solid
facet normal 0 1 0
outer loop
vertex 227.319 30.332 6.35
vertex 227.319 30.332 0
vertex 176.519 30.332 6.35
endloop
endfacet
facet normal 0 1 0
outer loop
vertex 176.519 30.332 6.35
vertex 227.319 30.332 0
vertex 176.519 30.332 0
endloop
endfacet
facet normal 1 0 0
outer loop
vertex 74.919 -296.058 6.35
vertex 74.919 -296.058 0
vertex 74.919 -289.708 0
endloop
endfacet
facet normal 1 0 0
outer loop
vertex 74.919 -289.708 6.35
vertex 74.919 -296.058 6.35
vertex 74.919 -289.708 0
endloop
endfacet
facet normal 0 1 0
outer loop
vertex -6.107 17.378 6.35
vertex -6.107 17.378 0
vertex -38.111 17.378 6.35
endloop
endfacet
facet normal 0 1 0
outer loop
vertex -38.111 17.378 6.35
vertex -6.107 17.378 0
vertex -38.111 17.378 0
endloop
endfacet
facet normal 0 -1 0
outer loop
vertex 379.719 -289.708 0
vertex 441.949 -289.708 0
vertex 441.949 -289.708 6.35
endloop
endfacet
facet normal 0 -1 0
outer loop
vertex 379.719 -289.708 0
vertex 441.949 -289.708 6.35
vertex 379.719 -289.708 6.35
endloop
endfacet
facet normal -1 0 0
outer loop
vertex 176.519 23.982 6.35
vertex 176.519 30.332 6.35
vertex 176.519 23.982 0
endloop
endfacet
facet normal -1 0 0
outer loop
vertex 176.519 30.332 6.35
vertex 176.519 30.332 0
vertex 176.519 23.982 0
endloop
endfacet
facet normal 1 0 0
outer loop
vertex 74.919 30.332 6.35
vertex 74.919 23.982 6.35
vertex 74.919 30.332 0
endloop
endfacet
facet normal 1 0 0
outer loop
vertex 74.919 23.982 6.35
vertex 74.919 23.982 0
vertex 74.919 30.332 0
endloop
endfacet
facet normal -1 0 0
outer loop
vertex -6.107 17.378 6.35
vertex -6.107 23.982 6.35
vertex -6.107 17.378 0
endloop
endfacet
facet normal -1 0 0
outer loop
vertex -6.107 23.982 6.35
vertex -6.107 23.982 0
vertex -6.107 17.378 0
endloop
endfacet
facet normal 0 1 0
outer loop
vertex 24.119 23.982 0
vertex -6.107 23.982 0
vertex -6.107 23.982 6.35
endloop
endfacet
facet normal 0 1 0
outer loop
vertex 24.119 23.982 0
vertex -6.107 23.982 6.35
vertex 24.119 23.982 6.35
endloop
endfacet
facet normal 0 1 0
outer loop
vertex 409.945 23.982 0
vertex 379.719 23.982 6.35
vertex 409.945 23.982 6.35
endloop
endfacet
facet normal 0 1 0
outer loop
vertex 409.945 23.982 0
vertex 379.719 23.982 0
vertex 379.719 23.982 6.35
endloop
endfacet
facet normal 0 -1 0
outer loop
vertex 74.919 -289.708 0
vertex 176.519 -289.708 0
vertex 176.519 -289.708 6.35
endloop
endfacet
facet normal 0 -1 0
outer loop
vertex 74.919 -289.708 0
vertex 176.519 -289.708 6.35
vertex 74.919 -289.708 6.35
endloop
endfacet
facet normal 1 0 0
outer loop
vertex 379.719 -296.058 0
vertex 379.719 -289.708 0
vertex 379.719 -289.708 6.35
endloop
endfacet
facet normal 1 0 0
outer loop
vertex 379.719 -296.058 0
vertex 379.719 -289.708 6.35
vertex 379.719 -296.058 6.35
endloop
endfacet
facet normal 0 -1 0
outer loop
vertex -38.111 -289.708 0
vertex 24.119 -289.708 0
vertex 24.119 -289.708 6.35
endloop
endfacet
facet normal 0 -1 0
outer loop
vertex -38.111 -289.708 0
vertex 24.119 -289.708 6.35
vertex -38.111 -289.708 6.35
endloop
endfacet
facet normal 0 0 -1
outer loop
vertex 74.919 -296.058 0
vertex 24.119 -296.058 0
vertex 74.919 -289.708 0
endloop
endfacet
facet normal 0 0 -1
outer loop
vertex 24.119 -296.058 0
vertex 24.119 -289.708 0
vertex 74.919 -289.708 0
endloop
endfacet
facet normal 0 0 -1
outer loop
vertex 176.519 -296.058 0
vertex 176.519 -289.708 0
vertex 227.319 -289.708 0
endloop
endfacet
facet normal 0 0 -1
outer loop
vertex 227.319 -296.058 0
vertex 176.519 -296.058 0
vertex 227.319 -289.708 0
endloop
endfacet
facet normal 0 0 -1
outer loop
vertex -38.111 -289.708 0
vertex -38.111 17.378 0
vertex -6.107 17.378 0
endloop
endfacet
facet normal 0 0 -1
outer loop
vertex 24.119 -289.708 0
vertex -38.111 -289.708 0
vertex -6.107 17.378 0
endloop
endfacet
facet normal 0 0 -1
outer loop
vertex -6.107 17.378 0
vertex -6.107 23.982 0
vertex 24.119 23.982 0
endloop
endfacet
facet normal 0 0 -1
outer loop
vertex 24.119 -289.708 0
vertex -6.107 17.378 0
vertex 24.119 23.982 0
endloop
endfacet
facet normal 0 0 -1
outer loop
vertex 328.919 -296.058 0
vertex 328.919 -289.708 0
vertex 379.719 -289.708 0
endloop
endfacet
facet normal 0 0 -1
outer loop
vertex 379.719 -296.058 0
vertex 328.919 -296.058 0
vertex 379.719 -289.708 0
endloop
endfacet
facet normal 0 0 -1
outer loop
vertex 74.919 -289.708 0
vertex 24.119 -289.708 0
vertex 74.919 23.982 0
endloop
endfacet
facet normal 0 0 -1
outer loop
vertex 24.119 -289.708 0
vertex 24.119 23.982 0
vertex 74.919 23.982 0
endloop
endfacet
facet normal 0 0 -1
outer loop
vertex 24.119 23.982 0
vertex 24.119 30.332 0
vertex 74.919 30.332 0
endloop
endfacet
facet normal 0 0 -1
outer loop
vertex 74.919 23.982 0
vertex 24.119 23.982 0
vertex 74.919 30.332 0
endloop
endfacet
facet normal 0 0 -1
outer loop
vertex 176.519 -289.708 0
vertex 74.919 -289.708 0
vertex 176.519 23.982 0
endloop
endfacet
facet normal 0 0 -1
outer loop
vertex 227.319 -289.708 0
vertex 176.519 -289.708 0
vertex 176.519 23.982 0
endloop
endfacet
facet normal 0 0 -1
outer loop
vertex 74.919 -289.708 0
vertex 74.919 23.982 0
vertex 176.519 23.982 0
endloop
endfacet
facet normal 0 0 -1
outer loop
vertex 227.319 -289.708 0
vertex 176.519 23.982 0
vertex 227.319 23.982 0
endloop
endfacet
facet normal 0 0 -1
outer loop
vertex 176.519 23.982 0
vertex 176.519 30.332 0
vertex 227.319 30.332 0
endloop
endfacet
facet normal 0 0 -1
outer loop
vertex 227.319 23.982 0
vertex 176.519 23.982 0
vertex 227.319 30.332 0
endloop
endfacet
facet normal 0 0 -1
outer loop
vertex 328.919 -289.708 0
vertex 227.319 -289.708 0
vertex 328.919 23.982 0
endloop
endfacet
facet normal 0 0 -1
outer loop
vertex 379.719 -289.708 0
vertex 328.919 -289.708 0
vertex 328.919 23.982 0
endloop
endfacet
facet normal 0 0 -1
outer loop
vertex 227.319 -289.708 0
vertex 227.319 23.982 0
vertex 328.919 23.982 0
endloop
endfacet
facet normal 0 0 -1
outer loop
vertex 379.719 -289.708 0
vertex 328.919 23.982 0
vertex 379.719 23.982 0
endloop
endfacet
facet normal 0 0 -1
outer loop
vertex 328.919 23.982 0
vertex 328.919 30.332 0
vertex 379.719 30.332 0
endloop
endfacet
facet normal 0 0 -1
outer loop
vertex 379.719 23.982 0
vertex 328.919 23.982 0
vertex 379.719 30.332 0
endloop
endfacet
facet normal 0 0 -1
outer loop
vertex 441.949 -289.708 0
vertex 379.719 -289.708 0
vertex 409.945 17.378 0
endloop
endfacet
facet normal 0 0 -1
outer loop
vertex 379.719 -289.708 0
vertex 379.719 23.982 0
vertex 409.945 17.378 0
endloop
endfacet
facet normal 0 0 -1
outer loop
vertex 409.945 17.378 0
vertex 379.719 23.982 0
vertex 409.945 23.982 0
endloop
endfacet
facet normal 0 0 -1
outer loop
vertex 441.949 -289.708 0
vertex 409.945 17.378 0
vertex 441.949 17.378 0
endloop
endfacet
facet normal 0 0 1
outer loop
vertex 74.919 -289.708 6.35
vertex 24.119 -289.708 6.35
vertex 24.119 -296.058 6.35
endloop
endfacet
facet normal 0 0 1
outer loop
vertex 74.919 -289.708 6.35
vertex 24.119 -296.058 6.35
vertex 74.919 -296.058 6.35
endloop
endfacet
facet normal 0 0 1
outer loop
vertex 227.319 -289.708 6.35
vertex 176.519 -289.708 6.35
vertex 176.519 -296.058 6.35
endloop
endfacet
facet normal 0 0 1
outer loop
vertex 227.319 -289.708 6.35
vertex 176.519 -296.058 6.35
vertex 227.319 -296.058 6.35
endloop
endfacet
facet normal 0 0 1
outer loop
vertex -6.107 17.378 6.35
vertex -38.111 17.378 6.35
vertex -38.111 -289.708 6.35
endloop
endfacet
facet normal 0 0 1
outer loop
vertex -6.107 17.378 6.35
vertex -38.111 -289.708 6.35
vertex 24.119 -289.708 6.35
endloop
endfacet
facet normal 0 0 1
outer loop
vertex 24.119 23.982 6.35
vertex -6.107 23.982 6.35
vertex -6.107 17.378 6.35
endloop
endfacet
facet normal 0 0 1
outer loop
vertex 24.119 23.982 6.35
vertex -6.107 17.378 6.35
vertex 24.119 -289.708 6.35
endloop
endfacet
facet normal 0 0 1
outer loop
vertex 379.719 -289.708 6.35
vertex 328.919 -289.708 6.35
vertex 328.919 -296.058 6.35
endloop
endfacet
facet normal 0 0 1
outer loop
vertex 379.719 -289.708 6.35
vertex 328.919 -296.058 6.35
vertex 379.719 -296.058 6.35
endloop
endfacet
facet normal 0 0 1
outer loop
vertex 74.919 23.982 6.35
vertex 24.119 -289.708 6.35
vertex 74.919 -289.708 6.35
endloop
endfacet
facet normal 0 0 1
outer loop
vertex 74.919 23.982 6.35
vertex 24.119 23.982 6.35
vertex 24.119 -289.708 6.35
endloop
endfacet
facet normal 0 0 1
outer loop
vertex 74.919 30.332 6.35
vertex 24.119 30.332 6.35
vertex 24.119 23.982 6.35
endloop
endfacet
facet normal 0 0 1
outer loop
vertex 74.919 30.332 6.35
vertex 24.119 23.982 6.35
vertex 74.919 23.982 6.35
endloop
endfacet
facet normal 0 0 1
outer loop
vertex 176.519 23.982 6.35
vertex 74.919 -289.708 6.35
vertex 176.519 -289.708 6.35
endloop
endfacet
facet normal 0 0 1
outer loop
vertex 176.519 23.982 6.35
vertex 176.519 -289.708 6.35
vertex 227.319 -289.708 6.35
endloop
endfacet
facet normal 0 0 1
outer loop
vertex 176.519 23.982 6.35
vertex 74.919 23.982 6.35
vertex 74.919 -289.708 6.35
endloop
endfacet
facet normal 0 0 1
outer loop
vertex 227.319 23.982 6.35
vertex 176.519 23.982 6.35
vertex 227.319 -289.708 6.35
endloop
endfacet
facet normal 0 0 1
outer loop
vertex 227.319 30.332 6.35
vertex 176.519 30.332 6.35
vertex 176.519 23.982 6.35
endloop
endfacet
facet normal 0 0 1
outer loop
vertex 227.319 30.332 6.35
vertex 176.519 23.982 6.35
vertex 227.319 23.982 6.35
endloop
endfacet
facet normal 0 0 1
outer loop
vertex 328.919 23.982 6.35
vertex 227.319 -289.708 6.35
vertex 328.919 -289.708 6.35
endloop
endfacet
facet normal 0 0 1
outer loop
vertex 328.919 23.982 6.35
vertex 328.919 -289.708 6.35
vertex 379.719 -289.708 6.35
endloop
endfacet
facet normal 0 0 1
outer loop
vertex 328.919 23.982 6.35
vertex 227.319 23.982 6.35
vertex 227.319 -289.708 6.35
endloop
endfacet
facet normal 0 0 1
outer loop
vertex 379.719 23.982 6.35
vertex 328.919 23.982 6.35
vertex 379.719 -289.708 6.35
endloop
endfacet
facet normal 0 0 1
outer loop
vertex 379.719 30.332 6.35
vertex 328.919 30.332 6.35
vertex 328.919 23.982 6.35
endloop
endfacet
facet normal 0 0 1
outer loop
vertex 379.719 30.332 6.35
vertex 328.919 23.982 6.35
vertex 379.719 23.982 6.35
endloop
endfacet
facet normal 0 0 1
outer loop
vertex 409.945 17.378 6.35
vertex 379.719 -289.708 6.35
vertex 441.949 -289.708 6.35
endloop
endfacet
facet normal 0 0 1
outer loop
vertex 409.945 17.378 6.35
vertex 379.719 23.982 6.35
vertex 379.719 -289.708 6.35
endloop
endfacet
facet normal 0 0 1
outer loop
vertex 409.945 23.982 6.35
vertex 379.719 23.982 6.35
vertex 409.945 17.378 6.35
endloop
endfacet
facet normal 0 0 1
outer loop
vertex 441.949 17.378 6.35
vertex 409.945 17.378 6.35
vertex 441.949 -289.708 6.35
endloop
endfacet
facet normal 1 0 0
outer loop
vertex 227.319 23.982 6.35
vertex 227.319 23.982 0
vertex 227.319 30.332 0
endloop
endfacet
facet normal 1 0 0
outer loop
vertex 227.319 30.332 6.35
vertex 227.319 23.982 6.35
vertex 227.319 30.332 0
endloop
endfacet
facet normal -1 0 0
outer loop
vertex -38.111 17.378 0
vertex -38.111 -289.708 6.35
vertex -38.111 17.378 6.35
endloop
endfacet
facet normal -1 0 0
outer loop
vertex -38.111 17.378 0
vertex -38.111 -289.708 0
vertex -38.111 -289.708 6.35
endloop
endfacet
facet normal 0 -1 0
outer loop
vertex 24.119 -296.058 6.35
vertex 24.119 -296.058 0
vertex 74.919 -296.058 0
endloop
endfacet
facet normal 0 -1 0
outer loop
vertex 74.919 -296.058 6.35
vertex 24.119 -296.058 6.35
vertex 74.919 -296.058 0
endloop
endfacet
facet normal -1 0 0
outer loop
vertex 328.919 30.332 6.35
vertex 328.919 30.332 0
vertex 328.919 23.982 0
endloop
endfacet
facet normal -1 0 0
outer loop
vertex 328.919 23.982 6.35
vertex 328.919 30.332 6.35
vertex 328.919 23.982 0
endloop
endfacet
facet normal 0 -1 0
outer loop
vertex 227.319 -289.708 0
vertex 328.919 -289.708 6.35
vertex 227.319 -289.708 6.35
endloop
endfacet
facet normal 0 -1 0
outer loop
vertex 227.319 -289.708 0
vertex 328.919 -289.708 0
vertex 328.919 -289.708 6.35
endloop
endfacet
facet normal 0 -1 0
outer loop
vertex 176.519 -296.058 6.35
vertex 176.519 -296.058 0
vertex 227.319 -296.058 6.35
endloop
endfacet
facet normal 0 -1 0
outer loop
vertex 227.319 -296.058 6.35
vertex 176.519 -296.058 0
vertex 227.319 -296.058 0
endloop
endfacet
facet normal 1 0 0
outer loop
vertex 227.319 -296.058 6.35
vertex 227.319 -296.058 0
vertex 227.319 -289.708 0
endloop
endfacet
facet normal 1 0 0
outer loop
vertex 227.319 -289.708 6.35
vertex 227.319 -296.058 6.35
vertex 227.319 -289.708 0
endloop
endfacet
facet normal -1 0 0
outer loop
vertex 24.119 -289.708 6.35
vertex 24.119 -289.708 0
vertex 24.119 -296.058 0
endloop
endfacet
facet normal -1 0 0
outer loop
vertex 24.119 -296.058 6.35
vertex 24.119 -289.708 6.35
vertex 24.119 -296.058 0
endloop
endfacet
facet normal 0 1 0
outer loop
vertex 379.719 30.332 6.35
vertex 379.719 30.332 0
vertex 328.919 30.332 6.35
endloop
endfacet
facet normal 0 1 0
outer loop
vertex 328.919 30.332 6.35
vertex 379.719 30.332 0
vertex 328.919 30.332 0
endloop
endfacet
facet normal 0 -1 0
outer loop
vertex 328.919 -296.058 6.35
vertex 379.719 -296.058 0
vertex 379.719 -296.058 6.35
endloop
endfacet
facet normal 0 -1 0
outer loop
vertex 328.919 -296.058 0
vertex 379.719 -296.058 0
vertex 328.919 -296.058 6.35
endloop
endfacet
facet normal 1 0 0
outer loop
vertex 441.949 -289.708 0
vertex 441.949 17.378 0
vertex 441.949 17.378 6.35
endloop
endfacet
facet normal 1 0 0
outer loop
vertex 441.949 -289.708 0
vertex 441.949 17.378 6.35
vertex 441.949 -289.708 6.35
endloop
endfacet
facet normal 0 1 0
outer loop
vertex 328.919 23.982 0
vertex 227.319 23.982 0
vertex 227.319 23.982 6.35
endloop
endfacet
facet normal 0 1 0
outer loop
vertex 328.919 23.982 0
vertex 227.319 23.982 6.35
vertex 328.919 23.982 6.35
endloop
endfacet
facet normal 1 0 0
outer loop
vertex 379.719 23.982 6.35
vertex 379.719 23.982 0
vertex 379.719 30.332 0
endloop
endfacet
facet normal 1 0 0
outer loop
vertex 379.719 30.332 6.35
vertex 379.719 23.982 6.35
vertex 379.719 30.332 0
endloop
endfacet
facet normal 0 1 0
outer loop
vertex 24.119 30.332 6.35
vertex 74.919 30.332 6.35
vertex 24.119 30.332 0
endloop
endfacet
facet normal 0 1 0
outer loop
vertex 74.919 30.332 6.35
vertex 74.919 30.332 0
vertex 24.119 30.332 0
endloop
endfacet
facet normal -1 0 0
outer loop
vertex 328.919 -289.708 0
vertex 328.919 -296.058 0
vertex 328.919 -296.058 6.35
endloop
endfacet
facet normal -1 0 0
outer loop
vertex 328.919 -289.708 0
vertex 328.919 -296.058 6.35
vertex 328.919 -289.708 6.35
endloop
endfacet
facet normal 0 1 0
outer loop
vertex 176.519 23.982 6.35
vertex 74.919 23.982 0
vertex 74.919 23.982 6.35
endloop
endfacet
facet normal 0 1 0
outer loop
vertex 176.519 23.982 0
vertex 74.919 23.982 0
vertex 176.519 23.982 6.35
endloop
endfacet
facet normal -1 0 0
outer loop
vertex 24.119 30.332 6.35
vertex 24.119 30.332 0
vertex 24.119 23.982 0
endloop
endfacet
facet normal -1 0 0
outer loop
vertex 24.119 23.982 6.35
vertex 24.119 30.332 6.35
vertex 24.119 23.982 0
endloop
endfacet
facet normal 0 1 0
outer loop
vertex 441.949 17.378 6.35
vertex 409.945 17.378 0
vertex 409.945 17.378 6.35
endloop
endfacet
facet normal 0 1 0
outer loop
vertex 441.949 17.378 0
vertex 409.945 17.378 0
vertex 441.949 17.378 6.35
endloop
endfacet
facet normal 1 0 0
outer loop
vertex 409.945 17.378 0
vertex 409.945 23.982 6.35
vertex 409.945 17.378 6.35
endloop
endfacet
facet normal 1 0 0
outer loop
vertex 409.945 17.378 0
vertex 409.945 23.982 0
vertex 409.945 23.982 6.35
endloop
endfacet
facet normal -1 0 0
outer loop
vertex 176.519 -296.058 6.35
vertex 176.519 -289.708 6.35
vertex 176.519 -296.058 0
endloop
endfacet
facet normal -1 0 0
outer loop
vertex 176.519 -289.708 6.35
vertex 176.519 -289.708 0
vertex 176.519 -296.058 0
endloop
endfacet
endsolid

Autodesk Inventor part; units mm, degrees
ref_plane "YZ Plane" through (0, 0, 0) normal (1, 0, 0) x (0, 1, 0)
ref_plane "XZ Plane" through (0, 0, 0) normal (0, 1, 0) x (-1, 0, 0)
ref_plane "XY Plane" through (0, 0, 0) normal (0, 0, 1) x (1, 0, 0)
sketch "Sketch1" plane through (0, 0, 0) normal (0, 0, 1) x (1, 0, 0)
  line L0 (-38.1107, 23.9821) -> (441.9493, 23.9821)
  line L1 (441.9493, 23.9821) -> (441.9493, -289.7079)
  line L2 (441.9493, -289.7079) -> (-38.1107, -289.7079)
  line L3 (-38.1107, -289.7079) -> (-38.1107, 23.9821)
  line L4 (-38.1107, -289.7079) -> (227.3193, -289.7079)
  line L5 (227.3193, -289.7079) -> (176.5193, -289.7079)
  line L6 (176.5193, -289.7079) -> (176.5193, -296.0579)
  line L7 (176.5193, -296.0579) -> (227.3193, -296.0579)
  line L8 (227.3193, -296.0579) -> (227.3193, -289.7079)
  line L9 (227.3193, -289.7079) -> (328.9193, -289.7079)
  line L10 (328.9193, -289.7079) -> (74.9193, -289.7079)
  line L11 (74.9193, -289.7079) -> (24.1193, -289.7079)
  line L12 (24.1193, -289.7079) -> (24.1193, -296.0579)
  line L13 (24.1193, -296.0579) -> (74.9193, -296.0579)
  line L14 (74.9193, -296.0579) -> (74.9193, -289.7079)
  line L15 (328.9193, -289.7079) -> (379.7193, -289.7079)
  line L16 (379.7193, -289.7079) -> (379.7193, -296.0579)
  line L17 (379.7193, -296.0579) -> (328.9193, -296.0579)
  line L18 (328.9193, -296.0579) -> (328.9193, -289.7079)
  line L19 (24.1193, 23.9821) -> (74.9193, 23.9821)
  line L20 (74.9193, 23.9821) -> (74.9193, 30.3321)
  line L21 (74.9193, 30.3321) -> (24.1193, 30.3321)
  line L22 (24.1193, 30.3321) -> (24.1193, 23.9821)
  line L23 (176.5193, 23.9821) -> (227.3193, 23.9821)
  line L24 (227.3193, 23.9821) -> (227.3193, 30.3321)
  line L25 (227.3193, 30.3321) -> (176.5193, 30.3321)
  line L26 (176.5193, 30.3321) -> (176.5193, 23.9821)
  line L27 (328.9193, 23.9821) -> (379.7193, 23.9821)
  line L28 (379.7193, 23.9821) -> (379.7193, 30.3321)
  line L29 (379.7193, 30.3321) -> (328.9193, 30.3321)
  line L30 (328.9193, 30.3321) -> (328.9193, 23.9821)
  line L31 (-38.1107, 23.9821) -> (-6.1067, 23.9821)
  line L32 (-6.1067, 23.9821) -> (-6.1067, 17.3781)
  line L33 (-6.1067, 17.3781) -> (-38.1107, 17.3781)
  line L34 (-38.1107, 17.3781) -> (-38.1107, 23.9821)
  line L35 (441.9493, 23.9821) -> (409.9453, 23.9821)
  line L36 (409.9453, 23.9821) -> (409.9453, 17.3781)
  line L37 (409.9453, 17.3781) -> (441.9493, 17.3781)
  line L38 (441.9493, 17.3781) -> (441.9493, 23.9821)
  point P0 (0, 0)
  dimension "d0" = 480.06
  dimension "d1" = 313.69
  dimension "d2" = 265.43
  dimension "d3" = 50.8
  dimension "d4" = 6.35
  dimension "d5" = 101.6
  dimension "d6" = 254
  dimension "d7" = 50.8
  dimension "d8" = 50.8
  dimension "d9" = 6.35
  dimension "d10" = 32.004
  dimension "d11" = 6.604
  dimension "d12" = 32.004
extrude "Extrusion1" add sketch "Sketch1" along normal blind 6.35 contours L0 L36 L37 L1 L2 L3 L33 L32 | L22 L21 L20 L0 | L2 L14 L13 L12 | L26 L25 L24 L0 | L2 L8 L7 L6 | L30 L29 L28 L0 | L2 L16 L17 L18
properties part number "it shelf"
